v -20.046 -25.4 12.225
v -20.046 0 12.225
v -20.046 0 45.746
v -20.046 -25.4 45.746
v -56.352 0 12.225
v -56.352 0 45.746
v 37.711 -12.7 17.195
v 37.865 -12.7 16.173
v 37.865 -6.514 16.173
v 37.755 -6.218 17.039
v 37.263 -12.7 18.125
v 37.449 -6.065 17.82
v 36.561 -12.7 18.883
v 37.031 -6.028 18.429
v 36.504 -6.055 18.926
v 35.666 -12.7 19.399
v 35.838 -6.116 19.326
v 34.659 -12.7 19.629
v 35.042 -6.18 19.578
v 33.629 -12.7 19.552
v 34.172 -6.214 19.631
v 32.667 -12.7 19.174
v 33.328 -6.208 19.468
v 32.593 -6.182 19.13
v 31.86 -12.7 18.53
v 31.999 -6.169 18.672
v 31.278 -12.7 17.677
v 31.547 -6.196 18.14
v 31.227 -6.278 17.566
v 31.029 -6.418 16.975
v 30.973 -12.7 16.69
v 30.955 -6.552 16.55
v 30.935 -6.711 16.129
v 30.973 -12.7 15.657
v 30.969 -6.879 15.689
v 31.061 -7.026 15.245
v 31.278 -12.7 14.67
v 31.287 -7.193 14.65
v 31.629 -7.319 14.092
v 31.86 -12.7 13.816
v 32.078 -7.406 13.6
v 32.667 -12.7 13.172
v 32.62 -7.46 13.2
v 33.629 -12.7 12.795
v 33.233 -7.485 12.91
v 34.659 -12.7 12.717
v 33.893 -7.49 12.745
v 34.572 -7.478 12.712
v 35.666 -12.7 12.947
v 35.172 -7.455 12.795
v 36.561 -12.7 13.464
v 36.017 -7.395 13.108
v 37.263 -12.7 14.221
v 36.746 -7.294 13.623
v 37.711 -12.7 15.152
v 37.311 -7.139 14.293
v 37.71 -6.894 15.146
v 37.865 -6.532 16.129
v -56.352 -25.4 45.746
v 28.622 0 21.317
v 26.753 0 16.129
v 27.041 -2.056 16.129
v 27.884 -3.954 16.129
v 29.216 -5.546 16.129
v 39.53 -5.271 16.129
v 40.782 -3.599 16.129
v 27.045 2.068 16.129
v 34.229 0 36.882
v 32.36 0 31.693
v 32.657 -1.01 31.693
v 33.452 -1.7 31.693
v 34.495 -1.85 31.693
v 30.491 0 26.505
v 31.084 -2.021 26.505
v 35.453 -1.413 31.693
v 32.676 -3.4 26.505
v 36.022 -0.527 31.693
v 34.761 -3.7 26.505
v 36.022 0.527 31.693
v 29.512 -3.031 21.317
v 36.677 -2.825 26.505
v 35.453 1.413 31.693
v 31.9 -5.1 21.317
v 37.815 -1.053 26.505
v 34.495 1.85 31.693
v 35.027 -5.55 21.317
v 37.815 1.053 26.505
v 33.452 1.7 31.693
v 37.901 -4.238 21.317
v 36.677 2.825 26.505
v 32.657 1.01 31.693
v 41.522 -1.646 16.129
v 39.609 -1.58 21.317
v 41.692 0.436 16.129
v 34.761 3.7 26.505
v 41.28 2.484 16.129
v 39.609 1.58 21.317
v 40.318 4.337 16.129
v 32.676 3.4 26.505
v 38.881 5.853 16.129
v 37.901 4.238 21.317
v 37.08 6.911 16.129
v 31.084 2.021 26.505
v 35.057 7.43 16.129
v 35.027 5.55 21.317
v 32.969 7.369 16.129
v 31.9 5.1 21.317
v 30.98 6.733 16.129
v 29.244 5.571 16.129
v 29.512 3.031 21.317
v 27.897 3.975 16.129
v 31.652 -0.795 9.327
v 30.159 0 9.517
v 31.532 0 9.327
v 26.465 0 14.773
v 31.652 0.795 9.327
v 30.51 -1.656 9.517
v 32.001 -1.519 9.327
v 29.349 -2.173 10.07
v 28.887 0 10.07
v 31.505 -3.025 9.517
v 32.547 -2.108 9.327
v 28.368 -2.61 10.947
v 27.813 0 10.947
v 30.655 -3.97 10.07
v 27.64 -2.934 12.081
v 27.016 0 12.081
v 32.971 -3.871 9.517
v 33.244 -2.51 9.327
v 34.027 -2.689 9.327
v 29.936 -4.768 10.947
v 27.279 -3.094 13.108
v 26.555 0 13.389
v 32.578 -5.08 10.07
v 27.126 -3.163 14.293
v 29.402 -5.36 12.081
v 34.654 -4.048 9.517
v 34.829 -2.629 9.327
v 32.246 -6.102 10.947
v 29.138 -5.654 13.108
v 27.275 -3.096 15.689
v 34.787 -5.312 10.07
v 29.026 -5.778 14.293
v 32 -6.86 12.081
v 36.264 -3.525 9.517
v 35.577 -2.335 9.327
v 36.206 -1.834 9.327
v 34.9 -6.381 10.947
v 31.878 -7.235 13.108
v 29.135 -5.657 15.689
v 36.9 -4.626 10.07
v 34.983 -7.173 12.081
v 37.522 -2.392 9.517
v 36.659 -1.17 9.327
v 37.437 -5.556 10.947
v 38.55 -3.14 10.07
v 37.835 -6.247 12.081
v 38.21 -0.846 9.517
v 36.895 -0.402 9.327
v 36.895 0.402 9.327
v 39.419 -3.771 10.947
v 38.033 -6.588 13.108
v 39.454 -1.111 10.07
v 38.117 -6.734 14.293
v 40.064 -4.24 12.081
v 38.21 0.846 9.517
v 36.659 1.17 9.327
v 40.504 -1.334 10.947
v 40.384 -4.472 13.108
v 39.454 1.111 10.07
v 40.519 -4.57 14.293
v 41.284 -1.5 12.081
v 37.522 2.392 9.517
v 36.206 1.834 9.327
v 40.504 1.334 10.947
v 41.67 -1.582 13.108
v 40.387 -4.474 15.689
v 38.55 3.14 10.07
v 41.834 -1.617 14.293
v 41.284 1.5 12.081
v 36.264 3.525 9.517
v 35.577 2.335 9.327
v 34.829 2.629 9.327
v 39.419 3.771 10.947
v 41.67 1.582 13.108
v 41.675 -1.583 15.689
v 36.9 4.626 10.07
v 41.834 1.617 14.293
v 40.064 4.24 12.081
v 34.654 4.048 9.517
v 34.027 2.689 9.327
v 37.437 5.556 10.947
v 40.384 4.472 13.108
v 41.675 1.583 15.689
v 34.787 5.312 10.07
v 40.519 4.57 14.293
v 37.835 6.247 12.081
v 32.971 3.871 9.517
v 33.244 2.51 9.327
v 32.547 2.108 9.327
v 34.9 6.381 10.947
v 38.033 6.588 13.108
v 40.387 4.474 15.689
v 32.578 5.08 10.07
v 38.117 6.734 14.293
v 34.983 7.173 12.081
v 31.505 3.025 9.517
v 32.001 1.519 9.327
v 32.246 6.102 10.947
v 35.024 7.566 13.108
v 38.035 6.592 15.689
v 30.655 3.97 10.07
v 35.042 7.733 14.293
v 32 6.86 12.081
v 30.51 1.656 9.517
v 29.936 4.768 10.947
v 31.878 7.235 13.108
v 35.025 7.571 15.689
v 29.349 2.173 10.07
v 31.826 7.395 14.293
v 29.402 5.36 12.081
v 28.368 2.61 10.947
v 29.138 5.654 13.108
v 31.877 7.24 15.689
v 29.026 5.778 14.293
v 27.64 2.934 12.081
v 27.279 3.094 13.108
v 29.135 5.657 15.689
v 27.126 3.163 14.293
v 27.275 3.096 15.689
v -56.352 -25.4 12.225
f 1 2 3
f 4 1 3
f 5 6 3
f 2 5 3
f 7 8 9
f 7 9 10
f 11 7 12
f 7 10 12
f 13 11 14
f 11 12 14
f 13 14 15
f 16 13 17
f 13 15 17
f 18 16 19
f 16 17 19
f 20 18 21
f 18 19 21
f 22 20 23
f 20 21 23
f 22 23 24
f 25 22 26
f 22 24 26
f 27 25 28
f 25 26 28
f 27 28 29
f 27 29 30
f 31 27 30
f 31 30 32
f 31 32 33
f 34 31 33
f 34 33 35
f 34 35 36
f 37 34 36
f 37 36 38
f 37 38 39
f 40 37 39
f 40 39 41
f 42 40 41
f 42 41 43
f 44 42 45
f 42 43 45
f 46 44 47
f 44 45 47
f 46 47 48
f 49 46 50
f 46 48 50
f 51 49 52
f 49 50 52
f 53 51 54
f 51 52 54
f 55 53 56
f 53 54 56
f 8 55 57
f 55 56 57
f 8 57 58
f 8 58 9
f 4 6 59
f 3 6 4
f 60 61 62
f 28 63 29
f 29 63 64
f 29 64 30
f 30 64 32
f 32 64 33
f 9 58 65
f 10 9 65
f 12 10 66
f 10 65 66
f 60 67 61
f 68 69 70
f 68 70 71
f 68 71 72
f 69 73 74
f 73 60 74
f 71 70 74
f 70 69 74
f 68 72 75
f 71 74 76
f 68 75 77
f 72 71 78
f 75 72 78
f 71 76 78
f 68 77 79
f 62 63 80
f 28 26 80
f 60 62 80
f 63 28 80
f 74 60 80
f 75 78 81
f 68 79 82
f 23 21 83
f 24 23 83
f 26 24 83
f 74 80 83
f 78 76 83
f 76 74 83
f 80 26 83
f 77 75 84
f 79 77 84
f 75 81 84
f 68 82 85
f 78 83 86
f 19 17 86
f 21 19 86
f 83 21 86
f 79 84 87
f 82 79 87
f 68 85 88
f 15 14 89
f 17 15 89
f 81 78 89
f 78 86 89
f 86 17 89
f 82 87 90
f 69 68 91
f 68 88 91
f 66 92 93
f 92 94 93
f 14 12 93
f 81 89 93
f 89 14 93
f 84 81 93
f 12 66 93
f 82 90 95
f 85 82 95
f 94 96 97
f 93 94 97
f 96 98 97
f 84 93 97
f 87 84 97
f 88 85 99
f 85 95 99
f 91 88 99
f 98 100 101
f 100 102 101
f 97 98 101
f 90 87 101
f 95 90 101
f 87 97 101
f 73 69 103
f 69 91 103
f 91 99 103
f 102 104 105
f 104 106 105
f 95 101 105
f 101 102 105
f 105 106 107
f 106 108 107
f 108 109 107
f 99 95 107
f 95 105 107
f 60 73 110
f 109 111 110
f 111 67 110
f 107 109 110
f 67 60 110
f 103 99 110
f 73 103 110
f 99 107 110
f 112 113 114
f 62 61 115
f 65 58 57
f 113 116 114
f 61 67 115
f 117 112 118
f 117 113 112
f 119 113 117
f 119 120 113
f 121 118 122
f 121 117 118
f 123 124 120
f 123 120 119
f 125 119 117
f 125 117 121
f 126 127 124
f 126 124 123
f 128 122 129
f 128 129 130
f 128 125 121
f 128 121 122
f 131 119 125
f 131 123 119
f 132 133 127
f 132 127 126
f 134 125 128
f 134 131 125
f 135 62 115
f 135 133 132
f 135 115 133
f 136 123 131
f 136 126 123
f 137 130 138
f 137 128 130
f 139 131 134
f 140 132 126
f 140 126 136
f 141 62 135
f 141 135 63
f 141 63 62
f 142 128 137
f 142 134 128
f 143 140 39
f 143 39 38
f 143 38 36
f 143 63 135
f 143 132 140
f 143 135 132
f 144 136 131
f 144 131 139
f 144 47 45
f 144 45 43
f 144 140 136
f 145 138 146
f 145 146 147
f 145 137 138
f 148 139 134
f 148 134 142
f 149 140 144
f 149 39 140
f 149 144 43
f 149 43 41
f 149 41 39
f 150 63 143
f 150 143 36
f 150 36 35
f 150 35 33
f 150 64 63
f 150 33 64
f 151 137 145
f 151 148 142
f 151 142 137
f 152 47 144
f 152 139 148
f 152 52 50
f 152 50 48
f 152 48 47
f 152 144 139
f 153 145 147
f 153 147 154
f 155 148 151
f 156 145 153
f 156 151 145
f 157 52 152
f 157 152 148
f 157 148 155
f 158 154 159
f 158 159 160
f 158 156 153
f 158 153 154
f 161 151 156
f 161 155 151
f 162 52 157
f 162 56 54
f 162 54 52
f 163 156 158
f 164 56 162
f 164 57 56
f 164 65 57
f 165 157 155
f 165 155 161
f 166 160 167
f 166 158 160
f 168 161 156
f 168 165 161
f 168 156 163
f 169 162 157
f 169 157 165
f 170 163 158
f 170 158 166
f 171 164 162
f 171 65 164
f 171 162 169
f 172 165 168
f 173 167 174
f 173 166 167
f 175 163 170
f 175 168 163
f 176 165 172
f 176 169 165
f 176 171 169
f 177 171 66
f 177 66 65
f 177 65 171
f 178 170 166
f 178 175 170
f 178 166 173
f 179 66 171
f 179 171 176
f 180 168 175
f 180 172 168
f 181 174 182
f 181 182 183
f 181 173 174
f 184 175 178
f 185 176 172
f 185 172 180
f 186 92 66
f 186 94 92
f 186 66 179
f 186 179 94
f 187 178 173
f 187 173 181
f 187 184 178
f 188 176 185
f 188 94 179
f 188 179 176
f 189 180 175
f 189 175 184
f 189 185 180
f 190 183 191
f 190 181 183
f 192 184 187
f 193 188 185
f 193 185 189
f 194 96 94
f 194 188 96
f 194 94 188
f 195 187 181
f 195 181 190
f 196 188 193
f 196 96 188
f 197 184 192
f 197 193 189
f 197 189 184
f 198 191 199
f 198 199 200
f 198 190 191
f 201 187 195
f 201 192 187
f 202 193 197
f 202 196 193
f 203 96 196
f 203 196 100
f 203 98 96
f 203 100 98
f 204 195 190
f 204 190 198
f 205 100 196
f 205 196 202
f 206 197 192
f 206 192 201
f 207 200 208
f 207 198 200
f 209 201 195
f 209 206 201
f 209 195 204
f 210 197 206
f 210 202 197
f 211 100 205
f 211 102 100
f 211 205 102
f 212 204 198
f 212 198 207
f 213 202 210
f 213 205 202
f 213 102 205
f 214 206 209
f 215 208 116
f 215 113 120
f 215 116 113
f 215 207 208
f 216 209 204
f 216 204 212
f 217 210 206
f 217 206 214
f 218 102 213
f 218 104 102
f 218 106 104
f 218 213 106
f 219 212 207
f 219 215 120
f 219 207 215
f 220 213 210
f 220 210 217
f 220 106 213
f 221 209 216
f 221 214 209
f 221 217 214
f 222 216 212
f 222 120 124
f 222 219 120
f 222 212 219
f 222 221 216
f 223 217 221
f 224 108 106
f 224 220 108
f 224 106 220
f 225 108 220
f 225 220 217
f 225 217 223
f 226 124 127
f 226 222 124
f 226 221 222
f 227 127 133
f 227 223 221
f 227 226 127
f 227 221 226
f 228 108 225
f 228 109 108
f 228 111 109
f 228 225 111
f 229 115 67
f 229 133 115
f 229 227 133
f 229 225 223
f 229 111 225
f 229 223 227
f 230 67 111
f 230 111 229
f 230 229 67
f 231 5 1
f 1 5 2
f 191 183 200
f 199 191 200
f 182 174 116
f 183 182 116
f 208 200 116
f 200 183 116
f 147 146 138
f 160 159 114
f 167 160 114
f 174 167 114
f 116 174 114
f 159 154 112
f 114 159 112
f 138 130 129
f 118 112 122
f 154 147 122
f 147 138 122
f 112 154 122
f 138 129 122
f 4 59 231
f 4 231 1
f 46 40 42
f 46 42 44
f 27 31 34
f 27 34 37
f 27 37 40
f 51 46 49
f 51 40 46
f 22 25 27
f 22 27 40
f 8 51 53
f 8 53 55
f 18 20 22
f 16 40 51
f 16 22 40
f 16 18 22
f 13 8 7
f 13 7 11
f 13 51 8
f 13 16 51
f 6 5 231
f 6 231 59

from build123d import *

# Parameters (mm, degrees)
F2_W     = 36.3068562001
F2_H     = 33.5211474448
F3_DEPTH = 25.4
F4_R     = 5.08
F5_R     = 3.4654105719
F6_DEPTH = 12.7


with BuildPart() as f1:
    # F0 (on Front) → F1 (revolve)
    with BuildSketch(Plane.XZ):
        Polygon((24.3025030941, 9.3273697421), (34.2288762331, 9.3273697421), (34.2288762331, 36.8816144764), align=None)
    revolve(axis=Axis((34.2288762331, 0, 23.1044921093), (0, 0, 1)))

    # F4
    f4_edges = [f1.edges().sort_by_distance(p)[0] for p in [
        (44.155249, 0, 9.32737),
    ]]
    fillet(f4_edges, radius=F4_R)

    # F5 (on Front) → F6 (join)
    with BuildSketch(Plane.XZ):
        with Locations((34.4000197947, 16.1731448025)):
            Circle(F5_R)
    extrude(amount=F6_DEPTH)


with BuildPart() as f3:
    # F2 (on Front) → F3 (new body)
    with BuildSketch(Plane.XZ):
        with Locations((-38.199015893, 28.9852423593)):
            Rectangle(F2_W, F2_H)
    extrude(amount=F3_DEPTH)


solid = Compound([f1.part, f3.part])
